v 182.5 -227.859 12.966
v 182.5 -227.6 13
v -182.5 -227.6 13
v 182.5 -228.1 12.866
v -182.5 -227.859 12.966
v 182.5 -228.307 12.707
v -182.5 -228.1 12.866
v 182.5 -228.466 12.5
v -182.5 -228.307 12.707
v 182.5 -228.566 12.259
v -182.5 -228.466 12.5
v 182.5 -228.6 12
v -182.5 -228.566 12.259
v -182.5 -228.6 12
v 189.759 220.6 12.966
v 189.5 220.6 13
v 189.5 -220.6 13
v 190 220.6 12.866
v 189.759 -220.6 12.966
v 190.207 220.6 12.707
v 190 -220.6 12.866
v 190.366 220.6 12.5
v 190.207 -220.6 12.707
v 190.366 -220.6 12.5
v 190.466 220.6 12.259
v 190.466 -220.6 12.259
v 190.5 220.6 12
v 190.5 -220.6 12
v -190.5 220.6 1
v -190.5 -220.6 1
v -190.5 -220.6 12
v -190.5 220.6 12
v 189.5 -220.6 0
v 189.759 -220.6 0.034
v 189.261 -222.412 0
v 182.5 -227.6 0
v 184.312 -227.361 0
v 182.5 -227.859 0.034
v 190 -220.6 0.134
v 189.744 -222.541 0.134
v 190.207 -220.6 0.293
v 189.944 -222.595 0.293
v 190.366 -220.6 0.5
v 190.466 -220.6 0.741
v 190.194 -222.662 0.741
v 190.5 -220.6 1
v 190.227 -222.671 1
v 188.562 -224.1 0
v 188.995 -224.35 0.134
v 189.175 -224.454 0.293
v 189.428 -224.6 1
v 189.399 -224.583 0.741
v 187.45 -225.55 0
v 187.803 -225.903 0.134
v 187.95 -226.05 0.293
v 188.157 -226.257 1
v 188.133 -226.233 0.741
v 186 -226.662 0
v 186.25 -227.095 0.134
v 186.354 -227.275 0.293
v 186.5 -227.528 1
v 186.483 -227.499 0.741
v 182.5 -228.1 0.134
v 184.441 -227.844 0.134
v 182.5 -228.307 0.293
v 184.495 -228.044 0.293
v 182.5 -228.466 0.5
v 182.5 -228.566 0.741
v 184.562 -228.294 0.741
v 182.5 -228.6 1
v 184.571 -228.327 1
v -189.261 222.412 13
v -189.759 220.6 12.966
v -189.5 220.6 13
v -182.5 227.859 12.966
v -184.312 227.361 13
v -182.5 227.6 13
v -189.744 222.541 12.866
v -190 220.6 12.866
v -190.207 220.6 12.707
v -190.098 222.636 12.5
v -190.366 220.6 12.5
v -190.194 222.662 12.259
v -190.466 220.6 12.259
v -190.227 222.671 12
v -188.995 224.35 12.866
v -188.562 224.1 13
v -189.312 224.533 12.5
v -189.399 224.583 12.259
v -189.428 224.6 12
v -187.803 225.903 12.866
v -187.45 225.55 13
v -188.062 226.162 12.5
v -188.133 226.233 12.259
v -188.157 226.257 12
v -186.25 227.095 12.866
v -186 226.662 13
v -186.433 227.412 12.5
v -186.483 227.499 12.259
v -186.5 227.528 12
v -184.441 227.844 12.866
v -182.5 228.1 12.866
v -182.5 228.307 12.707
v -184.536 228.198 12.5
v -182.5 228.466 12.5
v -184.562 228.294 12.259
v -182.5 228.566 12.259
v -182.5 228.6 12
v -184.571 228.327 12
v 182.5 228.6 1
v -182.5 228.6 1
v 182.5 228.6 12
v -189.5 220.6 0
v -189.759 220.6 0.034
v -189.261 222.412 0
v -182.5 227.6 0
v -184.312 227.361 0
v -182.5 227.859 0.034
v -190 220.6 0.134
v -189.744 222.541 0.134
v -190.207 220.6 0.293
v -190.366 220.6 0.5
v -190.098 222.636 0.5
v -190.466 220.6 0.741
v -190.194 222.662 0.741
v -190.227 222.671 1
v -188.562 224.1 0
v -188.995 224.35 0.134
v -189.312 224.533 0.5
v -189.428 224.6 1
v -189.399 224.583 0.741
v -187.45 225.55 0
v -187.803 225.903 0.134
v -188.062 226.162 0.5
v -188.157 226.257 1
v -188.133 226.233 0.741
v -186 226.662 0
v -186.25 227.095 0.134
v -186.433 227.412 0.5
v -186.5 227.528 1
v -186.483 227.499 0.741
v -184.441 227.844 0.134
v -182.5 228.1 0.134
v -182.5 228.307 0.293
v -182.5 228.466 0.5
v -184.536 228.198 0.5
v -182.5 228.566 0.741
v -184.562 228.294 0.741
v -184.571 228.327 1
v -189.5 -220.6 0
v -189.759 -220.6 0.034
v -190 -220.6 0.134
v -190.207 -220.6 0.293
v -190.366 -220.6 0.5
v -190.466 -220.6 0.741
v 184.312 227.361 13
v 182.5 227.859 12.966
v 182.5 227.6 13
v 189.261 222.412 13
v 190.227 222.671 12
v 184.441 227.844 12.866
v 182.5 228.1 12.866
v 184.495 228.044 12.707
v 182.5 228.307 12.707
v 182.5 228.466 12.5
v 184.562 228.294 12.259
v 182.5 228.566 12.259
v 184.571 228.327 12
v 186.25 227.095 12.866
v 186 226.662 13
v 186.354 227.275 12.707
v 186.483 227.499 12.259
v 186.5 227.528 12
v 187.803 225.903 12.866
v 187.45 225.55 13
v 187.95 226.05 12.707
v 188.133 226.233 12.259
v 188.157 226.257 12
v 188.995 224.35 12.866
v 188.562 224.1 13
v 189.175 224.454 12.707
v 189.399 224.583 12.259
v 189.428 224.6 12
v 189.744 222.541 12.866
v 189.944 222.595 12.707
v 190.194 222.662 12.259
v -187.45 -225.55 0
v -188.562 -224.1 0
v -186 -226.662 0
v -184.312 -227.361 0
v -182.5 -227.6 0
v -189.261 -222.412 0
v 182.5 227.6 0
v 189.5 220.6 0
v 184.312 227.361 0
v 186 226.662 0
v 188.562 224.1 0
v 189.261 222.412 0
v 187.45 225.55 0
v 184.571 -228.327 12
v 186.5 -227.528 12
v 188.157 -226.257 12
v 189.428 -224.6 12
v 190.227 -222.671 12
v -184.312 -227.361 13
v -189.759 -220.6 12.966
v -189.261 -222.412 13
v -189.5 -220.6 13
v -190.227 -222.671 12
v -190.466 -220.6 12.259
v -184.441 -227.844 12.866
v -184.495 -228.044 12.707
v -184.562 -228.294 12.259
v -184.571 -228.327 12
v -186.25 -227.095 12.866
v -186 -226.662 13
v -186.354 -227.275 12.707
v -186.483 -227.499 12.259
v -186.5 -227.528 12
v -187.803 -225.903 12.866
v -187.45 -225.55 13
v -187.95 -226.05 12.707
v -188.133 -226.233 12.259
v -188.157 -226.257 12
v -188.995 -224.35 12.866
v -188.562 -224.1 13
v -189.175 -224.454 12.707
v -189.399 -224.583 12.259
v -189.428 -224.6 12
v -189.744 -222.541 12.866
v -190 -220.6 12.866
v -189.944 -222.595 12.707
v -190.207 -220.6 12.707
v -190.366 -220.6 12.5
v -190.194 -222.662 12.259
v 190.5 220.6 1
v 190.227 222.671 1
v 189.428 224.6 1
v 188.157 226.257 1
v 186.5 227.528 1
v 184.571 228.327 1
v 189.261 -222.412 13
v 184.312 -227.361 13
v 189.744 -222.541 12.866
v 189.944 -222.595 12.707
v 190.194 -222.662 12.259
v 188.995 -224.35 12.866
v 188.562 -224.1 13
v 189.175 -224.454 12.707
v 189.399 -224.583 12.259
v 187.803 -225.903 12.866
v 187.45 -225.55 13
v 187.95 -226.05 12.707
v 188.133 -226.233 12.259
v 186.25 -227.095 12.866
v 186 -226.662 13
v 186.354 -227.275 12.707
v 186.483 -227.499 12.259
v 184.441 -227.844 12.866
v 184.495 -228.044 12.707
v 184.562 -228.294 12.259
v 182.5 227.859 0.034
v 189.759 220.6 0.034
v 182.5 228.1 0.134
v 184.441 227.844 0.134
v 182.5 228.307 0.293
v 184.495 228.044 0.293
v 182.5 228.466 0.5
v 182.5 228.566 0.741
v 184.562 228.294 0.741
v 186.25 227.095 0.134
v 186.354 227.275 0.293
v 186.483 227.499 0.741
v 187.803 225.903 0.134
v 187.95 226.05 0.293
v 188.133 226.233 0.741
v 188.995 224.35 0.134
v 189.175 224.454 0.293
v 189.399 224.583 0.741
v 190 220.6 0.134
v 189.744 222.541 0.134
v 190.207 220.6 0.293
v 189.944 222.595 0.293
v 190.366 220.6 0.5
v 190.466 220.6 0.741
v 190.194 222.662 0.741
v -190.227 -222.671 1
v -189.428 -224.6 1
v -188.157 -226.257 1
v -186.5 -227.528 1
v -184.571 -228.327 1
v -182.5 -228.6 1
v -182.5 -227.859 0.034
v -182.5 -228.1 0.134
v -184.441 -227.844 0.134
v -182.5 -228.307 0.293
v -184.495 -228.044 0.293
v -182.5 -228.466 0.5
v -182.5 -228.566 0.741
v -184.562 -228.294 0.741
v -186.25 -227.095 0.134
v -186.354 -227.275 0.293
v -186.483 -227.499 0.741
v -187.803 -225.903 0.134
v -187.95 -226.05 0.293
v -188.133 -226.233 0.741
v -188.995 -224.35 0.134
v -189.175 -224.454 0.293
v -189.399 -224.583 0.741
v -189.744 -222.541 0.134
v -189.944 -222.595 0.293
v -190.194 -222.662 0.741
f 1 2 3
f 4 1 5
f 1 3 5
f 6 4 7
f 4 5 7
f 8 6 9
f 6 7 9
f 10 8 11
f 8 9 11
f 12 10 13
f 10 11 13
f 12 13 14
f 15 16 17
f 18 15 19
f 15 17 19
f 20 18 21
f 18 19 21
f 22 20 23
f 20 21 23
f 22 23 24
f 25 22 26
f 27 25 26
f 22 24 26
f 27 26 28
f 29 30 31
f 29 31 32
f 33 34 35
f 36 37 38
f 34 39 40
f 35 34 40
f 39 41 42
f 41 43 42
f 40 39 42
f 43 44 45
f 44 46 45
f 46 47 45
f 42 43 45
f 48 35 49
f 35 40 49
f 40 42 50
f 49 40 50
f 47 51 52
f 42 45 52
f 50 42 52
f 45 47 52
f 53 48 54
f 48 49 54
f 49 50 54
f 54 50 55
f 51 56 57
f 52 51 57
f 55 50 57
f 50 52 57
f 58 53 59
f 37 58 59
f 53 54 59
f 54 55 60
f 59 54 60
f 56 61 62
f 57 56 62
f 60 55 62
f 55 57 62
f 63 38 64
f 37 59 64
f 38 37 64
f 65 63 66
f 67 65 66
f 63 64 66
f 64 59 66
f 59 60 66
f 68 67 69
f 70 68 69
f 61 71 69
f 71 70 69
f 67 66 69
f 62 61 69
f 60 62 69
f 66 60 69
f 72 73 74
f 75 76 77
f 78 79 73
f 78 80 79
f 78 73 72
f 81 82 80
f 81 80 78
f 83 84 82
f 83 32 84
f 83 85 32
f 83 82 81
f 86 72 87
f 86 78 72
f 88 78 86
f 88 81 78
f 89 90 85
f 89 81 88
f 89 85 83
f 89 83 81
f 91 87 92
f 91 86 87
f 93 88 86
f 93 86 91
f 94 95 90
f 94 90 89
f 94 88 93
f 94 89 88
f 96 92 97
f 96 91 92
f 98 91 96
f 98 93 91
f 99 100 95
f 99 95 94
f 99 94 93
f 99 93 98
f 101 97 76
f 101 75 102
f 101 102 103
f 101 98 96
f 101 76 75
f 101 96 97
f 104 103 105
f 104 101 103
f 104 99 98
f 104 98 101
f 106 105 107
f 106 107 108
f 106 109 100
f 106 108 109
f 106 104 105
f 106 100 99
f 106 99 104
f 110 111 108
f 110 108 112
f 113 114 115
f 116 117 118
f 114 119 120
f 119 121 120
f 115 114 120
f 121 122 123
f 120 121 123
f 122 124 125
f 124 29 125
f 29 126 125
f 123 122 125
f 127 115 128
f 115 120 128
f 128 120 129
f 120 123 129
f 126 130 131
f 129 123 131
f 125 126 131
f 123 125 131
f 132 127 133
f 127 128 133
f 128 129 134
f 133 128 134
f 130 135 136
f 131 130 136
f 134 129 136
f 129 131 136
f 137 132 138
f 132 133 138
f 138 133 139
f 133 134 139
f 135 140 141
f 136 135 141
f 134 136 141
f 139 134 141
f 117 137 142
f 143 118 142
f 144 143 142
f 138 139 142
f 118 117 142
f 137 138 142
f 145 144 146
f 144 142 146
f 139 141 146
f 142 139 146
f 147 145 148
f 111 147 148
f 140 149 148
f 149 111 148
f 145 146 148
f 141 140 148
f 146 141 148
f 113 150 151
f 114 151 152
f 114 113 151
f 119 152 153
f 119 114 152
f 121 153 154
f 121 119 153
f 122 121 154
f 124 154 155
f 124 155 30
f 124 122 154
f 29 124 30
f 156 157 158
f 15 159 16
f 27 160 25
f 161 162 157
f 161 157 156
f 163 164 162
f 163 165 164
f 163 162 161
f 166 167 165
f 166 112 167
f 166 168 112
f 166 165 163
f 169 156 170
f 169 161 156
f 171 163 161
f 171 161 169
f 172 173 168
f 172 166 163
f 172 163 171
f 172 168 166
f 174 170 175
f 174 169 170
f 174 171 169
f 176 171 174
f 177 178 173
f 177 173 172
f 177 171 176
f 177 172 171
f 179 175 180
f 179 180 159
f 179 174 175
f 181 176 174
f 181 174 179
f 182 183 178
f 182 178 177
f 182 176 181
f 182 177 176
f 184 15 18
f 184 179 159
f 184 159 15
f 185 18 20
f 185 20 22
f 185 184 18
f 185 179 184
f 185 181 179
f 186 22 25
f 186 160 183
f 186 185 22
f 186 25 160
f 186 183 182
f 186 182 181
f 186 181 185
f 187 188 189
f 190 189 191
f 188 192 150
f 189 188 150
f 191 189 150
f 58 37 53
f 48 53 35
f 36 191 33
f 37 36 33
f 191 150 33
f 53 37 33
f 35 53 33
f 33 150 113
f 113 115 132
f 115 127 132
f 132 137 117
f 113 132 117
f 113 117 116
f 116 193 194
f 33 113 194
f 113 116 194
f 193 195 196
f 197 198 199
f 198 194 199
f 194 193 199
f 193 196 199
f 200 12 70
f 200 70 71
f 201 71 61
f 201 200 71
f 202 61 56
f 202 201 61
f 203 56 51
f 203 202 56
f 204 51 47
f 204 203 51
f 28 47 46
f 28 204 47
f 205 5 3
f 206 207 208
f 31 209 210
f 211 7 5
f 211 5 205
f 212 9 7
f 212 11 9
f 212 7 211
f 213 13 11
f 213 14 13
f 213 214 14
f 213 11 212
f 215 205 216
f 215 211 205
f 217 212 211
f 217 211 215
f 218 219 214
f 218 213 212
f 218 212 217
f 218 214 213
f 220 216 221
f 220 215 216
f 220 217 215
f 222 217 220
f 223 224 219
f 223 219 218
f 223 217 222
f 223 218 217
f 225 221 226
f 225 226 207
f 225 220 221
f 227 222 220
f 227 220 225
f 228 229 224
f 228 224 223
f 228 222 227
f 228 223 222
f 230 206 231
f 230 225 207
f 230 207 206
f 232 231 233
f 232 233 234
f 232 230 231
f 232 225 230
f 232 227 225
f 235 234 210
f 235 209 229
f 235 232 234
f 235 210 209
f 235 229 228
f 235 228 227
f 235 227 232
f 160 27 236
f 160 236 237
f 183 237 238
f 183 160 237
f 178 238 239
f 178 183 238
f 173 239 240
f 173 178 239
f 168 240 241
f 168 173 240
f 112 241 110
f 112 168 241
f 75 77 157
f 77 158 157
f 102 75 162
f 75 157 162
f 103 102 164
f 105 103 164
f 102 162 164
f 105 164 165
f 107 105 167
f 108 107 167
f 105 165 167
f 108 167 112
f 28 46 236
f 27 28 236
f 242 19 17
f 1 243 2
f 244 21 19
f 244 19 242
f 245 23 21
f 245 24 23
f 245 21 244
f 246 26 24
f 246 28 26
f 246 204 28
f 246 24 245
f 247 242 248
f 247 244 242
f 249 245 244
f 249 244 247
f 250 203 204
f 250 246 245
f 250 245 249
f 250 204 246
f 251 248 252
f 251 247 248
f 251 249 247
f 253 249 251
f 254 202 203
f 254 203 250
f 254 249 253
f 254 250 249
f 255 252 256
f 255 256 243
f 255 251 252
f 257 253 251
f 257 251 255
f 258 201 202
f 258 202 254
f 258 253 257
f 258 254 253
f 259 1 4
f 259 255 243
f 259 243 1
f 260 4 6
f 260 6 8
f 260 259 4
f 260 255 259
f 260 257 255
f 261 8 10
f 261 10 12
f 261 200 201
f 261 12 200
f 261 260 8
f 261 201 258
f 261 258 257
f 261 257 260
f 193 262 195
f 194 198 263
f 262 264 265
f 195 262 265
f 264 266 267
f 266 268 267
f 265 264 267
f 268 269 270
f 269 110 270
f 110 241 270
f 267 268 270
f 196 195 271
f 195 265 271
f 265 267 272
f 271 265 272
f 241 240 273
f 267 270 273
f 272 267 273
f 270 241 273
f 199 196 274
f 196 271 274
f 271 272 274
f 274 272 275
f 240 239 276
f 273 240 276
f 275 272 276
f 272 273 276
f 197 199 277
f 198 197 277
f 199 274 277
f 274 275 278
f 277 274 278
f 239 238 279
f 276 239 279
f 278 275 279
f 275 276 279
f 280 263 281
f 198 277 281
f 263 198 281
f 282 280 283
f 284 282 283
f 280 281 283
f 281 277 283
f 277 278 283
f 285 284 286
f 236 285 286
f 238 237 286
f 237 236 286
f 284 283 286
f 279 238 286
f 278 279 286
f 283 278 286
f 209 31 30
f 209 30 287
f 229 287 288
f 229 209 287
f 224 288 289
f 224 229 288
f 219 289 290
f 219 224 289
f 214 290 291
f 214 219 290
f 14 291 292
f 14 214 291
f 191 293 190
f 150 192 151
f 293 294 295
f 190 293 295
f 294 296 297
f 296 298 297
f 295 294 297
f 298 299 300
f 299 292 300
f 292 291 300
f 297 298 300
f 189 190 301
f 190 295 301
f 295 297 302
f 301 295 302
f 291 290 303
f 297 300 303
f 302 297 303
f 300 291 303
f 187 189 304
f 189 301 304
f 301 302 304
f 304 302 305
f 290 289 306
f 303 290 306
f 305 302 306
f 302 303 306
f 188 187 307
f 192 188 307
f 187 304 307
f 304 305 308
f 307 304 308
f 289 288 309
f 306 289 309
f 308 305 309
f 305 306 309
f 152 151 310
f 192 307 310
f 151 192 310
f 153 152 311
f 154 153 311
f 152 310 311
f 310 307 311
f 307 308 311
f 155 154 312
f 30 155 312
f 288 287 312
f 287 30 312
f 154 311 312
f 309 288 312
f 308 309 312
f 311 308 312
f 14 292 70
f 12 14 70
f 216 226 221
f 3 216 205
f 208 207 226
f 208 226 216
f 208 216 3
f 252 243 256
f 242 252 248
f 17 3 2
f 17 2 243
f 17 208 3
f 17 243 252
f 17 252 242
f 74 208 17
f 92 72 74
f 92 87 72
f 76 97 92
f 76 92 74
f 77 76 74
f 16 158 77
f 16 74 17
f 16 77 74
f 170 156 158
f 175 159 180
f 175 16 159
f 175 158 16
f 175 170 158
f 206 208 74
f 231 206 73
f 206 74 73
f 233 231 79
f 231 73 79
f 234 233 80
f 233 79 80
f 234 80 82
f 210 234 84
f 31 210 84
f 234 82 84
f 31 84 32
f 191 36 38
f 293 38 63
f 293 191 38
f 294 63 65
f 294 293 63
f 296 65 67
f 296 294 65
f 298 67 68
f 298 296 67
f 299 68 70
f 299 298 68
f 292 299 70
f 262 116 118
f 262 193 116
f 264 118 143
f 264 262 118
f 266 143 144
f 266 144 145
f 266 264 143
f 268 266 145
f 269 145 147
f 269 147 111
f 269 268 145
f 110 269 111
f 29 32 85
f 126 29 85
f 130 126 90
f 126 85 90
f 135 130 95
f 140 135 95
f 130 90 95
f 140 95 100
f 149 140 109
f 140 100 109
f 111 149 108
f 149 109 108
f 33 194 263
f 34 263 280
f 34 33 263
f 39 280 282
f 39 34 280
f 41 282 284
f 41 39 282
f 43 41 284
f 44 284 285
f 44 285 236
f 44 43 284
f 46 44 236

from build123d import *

# Parameters (mm, degrees)
SKETCH1_W           = 381
SKETCH1_H           = 457.2
BOSS_EXTRUDE1_DEPTH = 13
FILLET1_R           = 8
FILLET2_R           = 1


with BuildPart() as part:
    # Sketch1 → Boss-Extrude1 (new body)
    with BuildSketch(Plane.XY):
        Rectangle(SKETCH1_W, SKETCH1_H)
    extrude(amount=BOSS_EXTRUDE1_DEPTH)

    # Fillet1
    fillet1_edges = [part.edges().sort_by_distance(p)[0] for p in [
        (190.5, -228.6, 6.5),
        (-190.5, -228.6, 6.5),
        (-190.5, 228.6, 6.5),
        (190.5, 228.6, 6.5),
    ]]
    fillet(fillet1_edges, radius=FILLET1_R)

    # Fillet2
    fillet2_edges = [part.edges().sort_by_distance(p)[0] for p in [
        (0, 228.6, 0),
        (0, 228.6, 13),
        (190.5, 0, 0),
        (0, -228.6, 0),
        (-190.5, 0, 0),
        (-188.156854249, -226.256854249, 0),
        (188.156854249, -226.256854249, 0),
        (-188.156854249, 226.256854249, 0),
        (188.156854249, 226.256854249, 0),
        (190.5, 0, 13),
        (-190.5, 0, 13),
        (0, -228.6, 13),
        (-188.156854249, -226.256854249, 13),
        (188.156854249, -226.256854249, 13),
        (-188.156854249, 226.256854249, 13),
        (188.156854249, 226.256854249, 13),
    ]]
    fillet(fillet2_edges, radius=FILLET2_R)


solid = part.part
